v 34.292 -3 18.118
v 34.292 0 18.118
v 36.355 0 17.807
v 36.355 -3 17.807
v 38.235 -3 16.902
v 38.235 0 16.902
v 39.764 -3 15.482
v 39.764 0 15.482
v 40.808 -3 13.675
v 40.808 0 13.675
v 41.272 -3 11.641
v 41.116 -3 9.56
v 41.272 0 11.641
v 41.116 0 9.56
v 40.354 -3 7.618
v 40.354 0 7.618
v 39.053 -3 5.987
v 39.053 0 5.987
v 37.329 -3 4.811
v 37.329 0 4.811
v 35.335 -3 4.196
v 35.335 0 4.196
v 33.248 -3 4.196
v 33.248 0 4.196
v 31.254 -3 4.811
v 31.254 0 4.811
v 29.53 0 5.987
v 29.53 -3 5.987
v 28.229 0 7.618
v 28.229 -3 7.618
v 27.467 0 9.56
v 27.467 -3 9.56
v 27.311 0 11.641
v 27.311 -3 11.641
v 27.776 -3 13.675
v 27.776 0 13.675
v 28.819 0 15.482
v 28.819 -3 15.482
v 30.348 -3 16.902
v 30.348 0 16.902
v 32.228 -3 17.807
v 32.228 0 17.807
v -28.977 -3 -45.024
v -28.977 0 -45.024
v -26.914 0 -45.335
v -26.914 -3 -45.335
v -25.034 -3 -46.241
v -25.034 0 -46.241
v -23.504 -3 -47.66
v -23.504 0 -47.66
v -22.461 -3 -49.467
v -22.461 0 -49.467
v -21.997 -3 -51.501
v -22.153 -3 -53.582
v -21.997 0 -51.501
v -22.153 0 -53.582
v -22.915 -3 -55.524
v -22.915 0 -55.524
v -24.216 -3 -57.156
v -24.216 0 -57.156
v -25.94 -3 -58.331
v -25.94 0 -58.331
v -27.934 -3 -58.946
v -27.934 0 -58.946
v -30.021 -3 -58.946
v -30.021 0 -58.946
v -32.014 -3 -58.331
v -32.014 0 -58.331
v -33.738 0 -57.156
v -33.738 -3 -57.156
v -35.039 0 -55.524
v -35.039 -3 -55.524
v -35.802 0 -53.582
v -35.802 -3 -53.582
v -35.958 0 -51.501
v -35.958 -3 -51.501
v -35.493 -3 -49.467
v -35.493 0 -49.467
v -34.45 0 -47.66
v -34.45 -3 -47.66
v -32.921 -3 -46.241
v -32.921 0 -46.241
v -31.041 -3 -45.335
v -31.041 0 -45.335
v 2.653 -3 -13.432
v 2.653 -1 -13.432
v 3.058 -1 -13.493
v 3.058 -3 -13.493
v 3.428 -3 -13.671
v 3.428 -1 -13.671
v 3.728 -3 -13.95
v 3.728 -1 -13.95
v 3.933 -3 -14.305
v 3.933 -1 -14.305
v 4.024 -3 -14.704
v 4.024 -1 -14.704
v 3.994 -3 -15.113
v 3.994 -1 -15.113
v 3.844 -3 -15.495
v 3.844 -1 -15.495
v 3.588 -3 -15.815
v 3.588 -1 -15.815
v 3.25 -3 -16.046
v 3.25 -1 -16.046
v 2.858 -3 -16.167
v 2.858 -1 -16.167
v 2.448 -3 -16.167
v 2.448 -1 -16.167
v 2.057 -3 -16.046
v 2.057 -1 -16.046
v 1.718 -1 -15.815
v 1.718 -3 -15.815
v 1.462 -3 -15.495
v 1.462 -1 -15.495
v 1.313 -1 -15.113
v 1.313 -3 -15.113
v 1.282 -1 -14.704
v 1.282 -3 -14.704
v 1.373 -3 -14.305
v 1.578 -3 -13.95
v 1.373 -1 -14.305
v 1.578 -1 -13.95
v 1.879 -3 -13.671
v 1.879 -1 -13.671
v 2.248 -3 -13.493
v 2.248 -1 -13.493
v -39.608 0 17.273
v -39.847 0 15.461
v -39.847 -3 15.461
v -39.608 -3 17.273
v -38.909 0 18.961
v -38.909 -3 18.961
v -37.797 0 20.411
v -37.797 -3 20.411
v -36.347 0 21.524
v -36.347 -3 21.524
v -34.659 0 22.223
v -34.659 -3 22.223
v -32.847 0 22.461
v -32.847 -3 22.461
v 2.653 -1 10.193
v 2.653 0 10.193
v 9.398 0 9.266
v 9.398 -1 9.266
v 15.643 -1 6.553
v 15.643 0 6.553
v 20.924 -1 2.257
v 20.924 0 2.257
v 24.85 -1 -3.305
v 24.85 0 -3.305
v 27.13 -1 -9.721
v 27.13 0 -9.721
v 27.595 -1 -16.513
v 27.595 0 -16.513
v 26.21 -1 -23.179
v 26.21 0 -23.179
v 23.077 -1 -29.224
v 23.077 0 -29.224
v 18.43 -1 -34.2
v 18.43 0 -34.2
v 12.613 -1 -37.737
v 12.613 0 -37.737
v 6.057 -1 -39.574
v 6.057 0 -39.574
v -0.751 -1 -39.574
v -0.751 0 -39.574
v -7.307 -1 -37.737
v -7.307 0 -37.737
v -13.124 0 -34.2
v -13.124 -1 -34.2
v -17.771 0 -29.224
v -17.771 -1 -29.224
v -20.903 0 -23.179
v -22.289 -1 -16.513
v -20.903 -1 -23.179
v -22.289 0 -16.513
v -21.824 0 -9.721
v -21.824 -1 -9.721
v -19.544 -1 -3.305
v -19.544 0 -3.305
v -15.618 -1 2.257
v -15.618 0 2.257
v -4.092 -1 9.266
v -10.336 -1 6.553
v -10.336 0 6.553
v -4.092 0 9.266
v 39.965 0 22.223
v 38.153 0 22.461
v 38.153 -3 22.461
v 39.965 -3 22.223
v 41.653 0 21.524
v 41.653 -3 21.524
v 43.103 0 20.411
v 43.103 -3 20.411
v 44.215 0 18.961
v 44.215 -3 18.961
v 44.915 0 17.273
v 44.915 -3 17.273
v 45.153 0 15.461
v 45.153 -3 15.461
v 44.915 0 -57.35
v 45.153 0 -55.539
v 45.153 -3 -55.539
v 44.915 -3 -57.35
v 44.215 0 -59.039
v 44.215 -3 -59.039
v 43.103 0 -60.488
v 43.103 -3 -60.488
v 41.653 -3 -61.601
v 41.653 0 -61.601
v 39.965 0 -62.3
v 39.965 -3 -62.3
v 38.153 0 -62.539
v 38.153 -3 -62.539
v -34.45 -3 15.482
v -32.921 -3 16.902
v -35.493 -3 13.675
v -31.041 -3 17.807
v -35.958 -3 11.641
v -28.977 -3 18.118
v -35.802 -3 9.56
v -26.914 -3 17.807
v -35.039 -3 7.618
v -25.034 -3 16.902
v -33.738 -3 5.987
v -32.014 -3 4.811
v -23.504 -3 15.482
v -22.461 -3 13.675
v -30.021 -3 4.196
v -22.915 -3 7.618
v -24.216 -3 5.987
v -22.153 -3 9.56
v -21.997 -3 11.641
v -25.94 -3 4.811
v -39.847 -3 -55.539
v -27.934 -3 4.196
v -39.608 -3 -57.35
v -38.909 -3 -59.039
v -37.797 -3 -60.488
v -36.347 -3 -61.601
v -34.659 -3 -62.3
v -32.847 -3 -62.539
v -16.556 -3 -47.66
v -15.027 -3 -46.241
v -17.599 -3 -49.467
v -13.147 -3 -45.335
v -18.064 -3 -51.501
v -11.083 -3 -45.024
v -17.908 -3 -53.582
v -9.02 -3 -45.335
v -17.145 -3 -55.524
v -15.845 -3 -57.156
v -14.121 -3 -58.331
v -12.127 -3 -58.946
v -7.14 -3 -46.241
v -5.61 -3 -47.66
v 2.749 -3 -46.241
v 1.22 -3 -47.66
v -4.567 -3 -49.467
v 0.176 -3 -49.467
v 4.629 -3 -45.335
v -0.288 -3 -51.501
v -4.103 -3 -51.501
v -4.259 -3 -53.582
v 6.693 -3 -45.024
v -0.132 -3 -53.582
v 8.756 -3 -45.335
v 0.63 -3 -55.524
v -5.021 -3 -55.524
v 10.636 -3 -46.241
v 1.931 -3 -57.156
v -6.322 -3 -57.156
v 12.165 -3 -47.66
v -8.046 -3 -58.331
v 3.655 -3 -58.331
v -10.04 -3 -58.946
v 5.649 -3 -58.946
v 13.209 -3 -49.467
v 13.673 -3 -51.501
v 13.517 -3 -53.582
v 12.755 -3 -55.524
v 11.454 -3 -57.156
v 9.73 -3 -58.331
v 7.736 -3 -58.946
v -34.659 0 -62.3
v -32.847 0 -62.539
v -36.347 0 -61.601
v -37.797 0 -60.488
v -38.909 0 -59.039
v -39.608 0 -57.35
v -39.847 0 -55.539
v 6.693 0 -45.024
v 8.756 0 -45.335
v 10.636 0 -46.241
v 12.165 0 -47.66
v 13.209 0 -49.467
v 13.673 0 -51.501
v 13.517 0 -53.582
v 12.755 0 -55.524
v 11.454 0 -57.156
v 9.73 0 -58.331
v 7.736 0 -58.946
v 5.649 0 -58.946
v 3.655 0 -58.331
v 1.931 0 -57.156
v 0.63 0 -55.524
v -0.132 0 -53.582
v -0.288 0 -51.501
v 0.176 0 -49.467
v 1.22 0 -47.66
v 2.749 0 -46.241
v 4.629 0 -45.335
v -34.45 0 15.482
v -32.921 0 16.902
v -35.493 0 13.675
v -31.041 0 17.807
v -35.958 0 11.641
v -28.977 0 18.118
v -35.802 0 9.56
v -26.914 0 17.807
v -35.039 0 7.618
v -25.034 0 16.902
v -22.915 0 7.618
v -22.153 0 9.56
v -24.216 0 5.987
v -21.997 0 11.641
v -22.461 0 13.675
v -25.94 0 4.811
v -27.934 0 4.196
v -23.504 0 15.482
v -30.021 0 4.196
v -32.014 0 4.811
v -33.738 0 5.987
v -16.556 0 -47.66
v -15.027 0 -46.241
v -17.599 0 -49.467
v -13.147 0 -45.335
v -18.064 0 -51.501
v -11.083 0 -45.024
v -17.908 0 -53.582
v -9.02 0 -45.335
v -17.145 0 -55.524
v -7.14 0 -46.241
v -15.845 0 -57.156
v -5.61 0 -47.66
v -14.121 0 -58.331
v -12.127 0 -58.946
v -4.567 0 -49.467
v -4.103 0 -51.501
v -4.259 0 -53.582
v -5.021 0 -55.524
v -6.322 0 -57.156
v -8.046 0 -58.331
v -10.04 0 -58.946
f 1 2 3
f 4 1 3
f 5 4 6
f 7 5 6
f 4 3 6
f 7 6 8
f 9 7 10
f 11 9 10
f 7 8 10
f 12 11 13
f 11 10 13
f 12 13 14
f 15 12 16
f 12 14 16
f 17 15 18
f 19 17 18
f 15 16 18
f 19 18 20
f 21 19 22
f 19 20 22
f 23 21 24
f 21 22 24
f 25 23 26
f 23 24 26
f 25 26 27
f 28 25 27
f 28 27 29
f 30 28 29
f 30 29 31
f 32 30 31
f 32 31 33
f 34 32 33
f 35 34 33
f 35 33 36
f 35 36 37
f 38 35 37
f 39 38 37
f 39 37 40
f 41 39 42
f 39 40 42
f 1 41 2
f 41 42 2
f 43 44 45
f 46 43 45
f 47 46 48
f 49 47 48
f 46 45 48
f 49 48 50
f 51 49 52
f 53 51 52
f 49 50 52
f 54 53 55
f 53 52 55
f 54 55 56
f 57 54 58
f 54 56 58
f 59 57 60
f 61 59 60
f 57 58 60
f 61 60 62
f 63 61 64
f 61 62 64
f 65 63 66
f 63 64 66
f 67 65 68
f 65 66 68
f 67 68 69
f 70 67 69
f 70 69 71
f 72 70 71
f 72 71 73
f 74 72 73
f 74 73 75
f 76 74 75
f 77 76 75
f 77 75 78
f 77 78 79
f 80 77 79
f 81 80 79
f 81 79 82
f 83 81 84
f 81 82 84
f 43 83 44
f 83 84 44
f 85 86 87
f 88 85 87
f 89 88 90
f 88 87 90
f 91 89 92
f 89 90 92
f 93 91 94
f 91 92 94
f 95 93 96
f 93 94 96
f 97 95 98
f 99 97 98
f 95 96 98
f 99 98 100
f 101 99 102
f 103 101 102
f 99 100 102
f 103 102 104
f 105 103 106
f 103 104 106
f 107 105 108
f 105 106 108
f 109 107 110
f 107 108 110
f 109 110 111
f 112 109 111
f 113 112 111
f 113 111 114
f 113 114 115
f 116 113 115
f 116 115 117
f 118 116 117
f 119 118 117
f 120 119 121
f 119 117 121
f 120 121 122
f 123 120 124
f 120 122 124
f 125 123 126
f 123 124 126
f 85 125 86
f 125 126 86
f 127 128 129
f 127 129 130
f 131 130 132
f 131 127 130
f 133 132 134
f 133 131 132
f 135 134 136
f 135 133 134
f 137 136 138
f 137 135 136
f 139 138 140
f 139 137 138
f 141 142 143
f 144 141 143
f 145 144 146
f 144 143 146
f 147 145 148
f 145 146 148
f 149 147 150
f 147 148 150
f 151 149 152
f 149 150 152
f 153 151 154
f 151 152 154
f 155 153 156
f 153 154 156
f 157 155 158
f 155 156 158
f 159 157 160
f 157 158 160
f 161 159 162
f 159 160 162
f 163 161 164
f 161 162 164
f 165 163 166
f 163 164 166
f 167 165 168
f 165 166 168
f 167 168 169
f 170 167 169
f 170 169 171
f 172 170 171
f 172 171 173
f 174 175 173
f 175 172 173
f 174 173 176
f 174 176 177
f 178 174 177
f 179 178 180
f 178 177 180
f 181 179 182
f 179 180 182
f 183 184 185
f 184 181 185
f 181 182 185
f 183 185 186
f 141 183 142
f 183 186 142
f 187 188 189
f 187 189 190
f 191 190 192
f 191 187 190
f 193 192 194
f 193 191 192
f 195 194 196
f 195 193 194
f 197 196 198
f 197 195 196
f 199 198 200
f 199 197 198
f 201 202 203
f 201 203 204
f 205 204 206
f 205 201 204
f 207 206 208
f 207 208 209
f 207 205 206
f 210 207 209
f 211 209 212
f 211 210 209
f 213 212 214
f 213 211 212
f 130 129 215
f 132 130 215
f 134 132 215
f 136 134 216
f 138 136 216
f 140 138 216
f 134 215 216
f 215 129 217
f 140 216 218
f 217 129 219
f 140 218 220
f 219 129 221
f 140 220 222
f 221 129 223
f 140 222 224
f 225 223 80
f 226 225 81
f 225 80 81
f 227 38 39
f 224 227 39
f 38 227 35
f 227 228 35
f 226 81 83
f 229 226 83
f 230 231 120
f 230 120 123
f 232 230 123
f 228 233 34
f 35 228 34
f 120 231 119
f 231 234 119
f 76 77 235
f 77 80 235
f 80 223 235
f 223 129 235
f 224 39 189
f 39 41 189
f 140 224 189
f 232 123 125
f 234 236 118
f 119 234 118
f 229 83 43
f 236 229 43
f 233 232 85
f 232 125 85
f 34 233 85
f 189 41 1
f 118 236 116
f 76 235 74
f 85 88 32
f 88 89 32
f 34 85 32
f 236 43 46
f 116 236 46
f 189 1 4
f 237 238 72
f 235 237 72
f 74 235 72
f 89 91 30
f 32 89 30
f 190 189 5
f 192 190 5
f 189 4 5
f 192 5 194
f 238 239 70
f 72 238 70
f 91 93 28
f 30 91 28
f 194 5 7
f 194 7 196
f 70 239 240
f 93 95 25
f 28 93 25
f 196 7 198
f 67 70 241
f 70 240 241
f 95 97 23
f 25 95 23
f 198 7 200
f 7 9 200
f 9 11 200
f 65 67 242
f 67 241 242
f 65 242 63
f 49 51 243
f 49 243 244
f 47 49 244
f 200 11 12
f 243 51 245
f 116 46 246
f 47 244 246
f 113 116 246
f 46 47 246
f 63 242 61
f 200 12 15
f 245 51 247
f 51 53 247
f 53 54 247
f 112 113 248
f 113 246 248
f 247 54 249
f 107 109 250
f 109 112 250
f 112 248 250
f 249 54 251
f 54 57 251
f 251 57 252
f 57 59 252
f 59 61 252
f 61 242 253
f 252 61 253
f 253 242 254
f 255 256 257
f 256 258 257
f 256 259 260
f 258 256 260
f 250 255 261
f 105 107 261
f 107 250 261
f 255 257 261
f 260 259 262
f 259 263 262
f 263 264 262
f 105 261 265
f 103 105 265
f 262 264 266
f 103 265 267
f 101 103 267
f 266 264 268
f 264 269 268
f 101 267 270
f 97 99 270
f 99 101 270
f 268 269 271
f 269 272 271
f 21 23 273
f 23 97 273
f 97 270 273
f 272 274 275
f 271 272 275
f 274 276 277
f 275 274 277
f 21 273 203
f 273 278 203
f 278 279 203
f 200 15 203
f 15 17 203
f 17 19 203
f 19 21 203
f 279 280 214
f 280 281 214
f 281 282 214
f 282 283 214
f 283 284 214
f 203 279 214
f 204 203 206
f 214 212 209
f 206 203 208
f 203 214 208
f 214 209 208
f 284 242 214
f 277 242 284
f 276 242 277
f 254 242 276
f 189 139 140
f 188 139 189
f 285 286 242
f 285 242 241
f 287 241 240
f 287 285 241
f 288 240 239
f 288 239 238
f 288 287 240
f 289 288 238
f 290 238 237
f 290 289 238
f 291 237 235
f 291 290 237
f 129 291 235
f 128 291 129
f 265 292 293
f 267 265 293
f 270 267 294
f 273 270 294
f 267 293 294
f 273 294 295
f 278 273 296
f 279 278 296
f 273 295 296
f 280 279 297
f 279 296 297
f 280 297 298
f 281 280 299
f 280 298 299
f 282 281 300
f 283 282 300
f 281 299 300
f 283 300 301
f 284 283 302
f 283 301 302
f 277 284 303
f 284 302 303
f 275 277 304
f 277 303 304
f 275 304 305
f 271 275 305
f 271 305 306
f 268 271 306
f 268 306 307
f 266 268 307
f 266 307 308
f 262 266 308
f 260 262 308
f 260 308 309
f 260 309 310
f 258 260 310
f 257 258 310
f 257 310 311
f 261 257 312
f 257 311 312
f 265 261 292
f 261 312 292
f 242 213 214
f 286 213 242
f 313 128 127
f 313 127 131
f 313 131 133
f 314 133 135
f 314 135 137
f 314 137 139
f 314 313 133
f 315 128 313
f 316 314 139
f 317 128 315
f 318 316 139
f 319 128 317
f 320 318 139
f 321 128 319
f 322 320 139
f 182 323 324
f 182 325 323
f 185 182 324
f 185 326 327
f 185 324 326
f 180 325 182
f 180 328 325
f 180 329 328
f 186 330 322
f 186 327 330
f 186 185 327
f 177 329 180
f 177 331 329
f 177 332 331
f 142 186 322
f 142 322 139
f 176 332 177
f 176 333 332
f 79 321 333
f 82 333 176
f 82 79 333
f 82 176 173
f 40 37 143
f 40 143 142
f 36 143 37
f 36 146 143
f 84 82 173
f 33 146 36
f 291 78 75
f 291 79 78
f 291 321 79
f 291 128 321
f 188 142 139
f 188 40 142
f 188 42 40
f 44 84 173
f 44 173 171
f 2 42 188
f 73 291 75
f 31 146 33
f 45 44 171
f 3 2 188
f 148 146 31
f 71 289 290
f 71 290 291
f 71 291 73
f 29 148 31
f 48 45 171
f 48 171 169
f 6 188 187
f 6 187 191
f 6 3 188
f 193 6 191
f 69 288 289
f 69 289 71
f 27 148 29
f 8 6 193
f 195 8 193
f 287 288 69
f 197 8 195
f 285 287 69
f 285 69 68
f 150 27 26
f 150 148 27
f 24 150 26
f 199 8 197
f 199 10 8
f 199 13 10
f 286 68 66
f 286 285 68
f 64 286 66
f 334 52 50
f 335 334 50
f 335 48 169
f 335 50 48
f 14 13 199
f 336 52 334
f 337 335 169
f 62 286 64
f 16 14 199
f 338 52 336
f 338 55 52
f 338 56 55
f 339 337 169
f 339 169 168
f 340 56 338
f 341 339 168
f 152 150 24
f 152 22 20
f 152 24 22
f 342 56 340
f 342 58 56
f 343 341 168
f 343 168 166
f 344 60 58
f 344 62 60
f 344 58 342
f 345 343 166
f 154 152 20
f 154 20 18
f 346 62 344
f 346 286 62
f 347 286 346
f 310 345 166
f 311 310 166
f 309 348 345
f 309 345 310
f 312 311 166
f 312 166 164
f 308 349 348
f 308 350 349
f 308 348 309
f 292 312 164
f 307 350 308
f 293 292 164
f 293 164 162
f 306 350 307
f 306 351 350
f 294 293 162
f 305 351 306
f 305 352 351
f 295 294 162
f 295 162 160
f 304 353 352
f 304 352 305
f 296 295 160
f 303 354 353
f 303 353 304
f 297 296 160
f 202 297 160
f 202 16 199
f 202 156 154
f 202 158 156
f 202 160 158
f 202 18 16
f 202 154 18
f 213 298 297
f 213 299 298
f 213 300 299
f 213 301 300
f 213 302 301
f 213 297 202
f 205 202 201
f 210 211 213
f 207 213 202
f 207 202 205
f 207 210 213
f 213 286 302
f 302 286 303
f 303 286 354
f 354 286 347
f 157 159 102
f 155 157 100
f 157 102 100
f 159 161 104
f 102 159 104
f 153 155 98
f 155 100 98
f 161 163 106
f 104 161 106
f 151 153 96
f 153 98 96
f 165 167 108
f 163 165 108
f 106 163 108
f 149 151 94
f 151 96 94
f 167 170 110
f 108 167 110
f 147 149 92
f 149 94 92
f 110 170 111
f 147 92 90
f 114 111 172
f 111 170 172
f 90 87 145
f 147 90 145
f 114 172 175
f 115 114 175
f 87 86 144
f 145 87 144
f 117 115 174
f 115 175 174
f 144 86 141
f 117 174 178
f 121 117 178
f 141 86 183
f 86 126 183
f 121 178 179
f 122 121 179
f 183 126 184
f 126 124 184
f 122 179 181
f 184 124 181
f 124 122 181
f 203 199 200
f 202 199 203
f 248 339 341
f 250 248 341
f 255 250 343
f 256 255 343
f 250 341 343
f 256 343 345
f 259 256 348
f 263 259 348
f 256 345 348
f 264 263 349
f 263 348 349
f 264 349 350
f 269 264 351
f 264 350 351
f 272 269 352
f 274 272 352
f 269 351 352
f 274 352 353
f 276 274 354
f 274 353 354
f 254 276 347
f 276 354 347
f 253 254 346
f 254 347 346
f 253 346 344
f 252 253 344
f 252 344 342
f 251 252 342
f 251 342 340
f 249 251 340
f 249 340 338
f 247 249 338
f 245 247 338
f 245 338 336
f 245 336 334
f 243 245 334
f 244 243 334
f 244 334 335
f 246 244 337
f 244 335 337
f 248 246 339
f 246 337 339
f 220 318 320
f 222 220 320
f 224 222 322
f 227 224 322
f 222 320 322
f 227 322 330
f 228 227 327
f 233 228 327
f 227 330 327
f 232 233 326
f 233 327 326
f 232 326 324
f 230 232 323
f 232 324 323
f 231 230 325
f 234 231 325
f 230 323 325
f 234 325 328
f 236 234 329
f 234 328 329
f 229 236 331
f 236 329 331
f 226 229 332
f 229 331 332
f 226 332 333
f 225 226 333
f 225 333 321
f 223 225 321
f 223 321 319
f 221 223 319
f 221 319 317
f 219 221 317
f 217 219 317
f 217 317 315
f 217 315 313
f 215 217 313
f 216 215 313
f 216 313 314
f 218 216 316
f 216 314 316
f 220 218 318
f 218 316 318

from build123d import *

# Parameters (mm, degrees)
SKETCH1_R           = 25
SKETCH1_R_2         = 7
BOSS_EXTRUDE1_DEPTH = 3
BOSS_EXTRUDE3_START = -2
SKETCH3_R           = 25
BOSS_EXTRUDE3_DEPTH = 2
SKETCH4_R           = 1.375
CUT_EXTRUDE1_DEPTH  = 2


with BuildPart() as part:
    # Sketch1 → Boss-Extrude1 (new body)
    with BuildSketch(Plane(origin=(0, 0, 0), x_dir=(1, 0, 0), z_dir=(0, 1, 0))):
        with BuildLine():
            Line((-32.846869633, -22.461451991), (38.153130367, -22.461451991))
            ThreePointArc((38.153130367, -22.461451991), (43.102877835, -20.411199459), (45.153130367, -15.461451991))
            Line((45.153130367, -15.461451991), (45.153130367, 55.538548009))
            ThreePointArc((45.153130367, 55.538548009), (43.102877835, 60.488295478), (38.153130367, 62.538548009))
            Line((38.153130367, 62.538548009), (-32.846869633, 62.538548009))
            ThreePointArc((-32.846869633, 62.538548009), (-37.796617101, 60.488295478), (-39.846869633, 55.538548009))
            Line((-39.846869633, 55.538548009), (-39.846869633, -15.461451991))
            ThreePointArc((-39.846869633, -15.461451991), (-37.796617101, -20.411199459), (-32.846869633, -22.461451991))
        make_face()
        with Locations(Location((2.653130367, 14.80701719, 0), (0, 0, 270))):
            Circle(SKETCH1_R, mode=Mode.SUBTRACT)
        with Locations(Location((-28.97725989, 52.02421358, 0), (0, 0, 270))):
            Circle(SKETCH1_R_2, mode=Mode.SUBTRACT)
        with Locations(Location((-11.083315318, 52.02421358, 0), (0, 0, 270))):
            Circle(SKETCH1_R_2, mode=Mode.SUBTRACT)
        with Locations(Location((6.69252819, 52.02421358, 0), (0, 0, 270))):
            Circle(SKETCH1_R_2, mode=Mode.SUBTRACT)
        with Locations(Location((-28.97725989, -11.117962427, 0), (0, 0, 270))):
            Circle(SKETCH1_R_2, mode=Mode.SUBTRACT)
        with Locations(Location((34.291639837, -11.117962427, 0), (0, 0, 270))):
            Circle(SKETCH1_R_2, mode=Mode.SUBTRACT)
    extrude(amount=-BOSS_EXTRUDE1_DEPTH)

    # Sketch3 → Boss-Extrude3 (add)
    with BuildSketch(Plane(origin=(0, -3, 0), x_dir=(-1, 0, 0), z_dir=(0, -1, 0)).offset(BOSS_EXTRUDE3_START)):
        with Locations(Location((-2.653130367, 14.80701719, 0), (0, 0, 270))):
            Circle(SKETCH3_R)
    extrude(amount=BOSS_EXTRUDE3_DEPTH)

    # Sketch4 → Cut-Extrude1 (cut)
    with BuildSketch(Plane(origin=(0, -1, 0), x_dir=(1, 0, 0), z_dir=(0, 1, 0))):
        with Locations(Location((2.653130367, 14.80701719, 0), (0, 0, 270))):
            Circle(SKETCH4_R)
    extrude(amount=-CUT_EXTRUDE1_DEPTH, mode=Mode.SUBTRACT)


solid = part.part
